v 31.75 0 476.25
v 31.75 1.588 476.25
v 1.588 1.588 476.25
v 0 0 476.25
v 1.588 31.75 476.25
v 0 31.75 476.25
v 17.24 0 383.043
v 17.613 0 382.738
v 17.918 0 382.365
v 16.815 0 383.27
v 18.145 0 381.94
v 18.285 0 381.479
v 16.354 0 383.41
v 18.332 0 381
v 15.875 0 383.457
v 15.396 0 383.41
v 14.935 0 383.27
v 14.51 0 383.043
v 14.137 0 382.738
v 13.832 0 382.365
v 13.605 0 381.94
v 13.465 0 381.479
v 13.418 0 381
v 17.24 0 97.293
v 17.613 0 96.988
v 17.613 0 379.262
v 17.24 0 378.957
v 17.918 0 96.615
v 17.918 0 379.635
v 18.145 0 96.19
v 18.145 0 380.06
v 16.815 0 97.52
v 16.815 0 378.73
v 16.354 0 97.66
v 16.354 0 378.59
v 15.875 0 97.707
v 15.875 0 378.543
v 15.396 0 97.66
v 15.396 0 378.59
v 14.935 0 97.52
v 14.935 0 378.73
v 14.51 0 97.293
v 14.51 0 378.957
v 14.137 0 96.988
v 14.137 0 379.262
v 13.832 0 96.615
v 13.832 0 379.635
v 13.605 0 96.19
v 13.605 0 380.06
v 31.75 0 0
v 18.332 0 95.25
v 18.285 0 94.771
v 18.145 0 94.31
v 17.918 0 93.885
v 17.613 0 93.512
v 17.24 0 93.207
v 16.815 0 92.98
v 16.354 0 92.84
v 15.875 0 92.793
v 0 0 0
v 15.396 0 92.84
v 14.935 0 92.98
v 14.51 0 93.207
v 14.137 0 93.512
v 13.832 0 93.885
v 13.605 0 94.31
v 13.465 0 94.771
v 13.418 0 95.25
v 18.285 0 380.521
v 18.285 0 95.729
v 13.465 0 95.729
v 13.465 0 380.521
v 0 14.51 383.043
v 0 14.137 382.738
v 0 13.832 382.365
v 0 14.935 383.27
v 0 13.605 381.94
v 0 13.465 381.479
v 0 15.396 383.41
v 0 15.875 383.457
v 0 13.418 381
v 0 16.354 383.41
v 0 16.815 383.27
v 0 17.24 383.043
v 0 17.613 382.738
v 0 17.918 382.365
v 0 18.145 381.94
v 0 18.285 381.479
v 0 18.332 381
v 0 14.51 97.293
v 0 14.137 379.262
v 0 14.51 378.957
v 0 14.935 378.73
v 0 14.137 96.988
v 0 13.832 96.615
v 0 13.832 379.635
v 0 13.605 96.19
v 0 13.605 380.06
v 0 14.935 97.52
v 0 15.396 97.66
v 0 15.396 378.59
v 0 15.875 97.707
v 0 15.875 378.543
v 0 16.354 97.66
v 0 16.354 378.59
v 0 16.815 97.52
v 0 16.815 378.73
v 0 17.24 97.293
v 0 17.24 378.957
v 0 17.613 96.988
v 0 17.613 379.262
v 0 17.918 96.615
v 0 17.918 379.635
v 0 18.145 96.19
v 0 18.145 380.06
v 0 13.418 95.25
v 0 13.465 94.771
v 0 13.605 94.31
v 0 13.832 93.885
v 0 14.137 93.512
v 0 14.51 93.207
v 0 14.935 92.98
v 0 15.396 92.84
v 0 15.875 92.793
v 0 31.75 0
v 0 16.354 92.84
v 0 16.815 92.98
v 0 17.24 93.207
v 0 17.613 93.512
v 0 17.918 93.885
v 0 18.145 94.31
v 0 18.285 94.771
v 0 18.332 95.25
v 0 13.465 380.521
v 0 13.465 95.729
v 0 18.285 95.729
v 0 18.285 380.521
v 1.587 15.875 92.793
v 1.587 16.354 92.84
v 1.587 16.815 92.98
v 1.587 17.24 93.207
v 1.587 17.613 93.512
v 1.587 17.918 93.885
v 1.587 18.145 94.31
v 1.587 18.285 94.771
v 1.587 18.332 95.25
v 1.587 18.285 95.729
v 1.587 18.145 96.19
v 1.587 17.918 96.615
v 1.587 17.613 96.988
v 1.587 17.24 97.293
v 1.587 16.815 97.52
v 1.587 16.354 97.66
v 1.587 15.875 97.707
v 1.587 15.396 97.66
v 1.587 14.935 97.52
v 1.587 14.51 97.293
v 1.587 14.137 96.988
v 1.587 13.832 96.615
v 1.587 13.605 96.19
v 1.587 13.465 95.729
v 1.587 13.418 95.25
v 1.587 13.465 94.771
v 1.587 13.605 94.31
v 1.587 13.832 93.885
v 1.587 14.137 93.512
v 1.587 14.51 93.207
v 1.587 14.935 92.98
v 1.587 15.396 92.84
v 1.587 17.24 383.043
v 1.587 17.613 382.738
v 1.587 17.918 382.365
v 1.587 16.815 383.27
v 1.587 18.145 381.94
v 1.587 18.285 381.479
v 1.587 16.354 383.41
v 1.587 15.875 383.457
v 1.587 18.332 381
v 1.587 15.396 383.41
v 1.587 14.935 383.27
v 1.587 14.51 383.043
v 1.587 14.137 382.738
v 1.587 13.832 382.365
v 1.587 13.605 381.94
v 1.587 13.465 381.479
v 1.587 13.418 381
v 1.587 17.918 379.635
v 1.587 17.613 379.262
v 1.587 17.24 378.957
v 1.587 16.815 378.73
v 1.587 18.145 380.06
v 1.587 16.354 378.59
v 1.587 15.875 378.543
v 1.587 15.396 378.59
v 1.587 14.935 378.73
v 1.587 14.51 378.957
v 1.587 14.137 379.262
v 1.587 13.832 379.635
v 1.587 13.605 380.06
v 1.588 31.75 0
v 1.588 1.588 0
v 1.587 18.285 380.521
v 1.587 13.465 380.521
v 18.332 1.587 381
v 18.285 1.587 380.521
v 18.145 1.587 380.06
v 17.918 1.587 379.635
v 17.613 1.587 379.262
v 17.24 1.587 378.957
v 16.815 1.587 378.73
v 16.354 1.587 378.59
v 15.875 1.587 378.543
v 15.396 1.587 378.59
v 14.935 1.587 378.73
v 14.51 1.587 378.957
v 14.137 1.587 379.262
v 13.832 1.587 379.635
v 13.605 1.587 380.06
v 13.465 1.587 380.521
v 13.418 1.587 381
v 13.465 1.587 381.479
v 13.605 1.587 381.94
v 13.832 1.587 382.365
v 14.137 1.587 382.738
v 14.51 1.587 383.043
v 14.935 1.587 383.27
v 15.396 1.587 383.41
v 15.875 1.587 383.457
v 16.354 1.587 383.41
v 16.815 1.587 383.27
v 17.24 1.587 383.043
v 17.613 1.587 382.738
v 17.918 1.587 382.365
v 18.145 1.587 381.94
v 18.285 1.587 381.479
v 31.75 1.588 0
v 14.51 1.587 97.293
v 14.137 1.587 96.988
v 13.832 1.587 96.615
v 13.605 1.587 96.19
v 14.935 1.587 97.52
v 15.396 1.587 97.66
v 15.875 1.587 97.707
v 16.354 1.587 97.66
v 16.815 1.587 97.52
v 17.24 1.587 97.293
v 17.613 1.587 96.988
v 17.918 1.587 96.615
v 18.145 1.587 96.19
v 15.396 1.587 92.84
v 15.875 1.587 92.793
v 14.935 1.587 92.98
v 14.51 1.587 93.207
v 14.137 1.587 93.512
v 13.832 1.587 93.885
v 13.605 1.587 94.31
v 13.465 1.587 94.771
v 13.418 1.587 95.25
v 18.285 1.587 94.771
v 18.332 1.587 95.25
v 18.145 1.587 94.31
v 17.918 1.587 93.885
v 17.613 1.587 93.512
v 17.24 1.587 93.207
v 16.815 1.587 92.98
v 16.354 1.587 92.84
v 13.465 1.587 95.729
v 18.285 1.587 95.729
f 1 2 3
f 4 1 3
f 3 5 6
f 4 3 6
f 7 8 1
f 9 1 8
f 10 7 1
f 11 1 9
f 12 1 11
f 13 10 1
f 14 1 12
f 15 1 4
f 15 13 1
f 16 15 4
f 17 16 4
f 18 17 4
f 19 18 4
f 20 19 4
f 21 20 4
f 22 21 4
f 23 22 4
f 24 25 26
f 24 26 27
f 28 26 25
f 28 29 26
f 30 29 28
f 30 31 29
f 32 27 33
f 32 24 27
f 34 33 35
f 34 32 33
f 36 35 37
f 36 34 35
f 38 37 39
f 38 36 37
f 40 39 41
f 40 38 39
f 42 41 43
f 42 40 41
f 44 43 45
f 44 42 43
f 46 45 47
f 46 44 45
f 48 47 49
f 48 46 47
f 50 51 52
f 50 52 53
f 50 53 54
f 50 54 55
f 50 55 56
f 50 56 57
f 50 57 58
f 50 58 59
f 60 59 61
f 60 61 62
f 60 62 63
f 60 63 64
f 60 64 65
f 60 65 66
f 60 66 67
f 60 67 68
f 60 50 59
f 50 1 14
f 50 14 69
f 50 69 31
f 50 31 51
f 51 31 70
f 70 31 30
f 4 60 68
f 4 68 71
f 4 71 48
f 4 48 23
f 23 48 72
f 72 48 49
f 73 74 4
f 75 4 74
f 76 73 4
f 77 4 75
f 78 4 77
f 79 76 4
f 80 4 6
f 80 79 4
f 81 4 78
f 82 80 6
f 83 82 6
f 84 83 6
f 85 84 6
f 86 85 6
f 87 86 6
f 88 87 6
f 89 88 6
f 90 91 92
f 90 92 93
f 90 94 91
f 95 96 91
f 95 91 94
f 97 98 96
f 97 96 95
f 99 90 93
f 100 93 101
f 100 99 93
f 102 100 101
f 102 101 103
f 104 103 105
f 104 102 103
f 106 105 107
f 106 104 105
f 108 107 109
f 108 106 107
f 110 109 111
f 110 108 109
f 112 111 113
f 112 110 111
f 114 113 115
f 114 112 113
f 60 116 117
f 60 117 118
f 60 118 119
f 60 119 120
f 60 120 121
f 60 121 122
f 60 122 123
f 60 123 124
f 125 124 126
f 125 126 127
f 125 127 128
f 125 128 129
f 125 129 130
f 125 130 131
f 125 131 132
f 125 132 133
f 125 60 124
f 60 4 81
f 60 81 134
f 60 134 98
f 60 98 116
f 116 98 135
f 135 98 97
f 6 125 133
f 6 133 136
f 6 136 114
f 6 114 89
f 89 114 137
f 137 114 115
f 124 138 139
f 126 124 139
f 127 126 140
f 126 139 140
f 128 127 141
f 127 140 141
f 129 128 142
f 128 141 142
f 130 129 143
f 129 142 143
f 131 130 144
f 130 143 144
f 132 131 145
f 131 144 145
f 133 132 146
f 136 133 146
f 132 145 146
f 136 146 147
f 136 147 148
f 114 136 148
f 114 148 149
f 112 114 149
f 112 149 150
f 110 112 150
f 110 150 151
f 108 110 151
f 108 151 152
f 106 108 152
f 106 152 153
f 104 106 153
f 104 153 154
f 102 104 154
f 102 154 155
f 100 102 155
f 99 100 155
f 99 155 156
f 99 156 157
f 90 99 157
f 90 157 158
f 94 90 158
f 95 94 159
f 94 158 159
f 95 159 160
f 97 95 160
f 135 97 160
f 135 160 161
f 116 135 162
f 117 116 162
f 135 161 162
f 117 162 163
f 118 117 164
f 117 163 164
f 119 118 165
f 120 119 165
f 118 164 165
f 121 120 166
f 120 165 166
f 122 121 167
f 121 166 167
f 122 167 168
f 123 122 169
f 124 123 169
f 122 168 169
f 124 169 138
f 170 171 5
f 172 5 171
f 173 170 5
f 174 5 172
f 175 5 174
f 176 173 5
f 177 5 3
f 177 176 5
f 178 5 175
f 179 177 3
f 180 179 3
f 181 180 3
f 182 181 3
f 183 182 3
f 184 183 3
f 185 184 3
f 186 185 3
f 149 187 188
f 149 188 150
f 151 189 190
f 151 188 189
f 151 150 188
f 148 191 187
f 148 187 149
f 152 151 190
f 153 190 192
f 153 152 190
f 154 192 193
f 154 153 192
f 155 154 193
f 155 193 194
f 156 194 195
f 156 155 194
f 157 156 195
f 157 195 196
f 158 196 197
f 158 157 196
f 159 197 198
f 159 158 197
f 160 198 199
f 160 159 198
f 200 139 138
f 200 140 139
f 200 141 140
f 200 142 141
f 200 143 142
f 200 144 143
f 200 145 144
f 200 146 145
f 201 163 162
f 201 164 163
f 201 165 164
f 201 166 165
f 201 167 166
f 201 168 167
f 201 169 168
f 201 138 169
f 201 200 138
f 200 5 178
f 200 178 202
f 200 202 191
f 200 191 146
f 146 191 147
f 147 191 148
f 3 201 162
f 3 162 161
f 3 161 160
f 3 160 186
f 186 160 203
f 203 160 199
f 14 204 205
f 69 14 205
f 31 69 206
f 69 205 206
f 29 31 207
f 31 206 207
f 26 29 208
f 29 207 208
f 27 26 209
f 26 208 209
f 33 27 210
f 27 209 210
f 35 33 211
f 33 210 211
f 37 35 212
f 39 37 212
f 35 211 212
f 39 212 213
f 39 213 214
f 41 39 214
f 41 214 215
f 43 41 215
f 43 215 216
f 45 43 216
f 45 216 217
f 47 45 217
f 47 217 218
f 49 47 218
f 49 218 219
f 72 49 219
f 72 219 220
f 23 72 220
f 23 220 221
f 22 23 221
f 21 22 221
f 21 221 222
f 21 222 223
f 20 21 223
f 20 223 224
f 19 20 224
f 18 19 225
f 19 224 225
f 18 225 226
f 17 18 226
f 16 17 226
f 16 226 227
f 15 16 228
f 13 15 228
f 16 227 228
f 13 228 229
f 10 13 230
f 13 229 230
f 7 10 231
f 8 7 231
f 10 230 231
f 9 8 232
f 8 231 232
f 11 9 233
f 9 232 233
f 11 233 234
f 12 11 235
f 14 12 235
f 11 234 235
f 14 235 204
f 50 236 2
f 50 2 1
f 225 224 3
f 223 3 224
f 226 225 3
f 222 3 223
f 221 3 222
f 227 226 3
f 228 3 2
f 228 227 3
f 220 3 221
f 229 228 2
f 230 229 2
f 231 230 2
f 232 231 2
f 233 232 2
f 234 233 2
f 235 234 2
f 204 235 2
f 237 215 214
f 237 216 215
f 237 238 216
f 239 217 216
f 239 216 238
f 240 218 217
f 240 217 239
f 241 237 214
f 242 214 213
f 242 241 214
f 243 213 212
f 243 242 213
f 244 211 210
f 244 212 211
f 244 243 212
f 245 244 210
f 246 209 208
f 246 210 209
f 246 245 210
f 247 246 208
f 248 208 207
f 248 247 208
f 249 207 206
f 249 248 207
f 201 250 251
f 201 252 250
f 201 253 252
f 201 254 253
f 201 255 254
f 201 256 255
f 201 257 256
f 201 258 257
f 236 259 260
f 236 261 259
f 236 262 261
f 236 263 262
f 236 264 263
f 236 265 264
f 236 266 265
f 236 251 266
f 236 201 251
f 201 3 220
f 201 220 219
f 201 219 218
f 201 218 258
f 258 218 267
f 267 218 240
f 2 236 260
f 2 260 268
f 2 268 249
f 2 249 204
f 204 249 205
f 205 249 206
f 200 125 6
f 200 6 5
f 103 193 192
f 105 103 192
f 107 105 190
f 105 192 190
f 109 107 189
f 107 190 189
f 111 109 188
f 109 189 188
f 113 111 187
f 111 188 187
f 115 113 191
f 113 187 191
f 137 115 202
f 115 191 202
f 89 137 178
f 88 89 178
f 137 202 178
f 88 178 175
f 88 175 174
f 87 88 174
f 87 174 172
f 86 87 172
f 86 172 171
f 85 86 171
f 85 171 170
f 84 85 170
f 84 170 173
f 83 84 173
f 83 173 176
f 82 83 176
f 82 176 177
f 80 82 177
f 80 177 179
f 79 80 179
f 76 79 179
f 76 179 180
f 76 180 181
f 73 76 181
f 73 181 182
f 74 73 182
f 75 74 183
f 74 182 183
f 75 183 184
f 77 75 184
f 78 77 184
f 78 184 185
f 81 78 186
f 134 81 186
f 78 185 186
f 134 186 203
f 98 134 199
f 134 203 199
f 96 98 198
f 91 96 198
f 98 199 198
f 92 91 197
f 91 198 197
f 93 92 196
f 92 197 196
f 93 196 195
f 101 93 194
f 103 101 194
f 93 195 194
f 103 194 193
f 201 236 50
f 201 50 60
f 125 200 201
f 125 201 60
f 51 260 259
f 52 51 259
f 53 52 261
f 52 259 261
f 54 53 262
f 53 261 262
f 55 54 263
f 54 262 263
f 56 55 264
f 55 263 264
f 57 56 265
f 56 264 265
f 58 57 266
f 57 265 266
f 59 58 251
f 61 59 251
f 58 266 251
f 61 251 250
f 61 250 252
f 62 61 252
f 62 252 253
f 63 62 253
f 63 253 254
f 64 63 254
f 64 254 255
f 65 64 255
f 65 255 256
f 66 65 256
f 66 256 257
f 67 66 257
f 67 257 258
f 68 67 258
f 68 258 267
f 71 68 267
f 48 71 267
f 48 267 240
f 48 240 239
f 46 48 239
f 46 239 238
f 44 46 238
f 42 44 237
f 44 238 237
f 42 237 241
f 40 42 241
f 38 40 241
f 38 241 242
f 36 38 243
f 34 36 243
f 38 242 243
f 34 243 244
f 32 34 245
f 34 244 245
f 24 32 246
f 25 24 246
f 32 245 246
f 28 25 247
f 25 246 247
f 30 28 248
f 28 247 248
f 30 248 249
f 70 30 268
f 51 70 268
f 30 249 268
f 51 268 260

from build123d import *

# Parameters (mm, degrees)
BOSS_EXTRUDE1_DEPTH          = 476.25
F_10_0_1935_DIAMETER_HOLE1_D = 4.9149
F_10_0_1935_DIAMETER_HOLE2_D = 4.9149


with BuildPart() as part:
    # Sketch2 → Boss-Extrude1 (new body)
    with BuildSketch(Plane.XY):
        Polygon((0, 0), (0, 31.75), (1.5875, 31.75), (1.5875, 1.5875), (31.75, 1.5875), (31.75, 0), align=None)
    extrude(amount=BOSS_EXTRUDE1_DEPTH)

    # #10 (0.1935) Diameter Hole1 (through all)
    with Locations(Plane.ZY):
        with Locations((95.25, 15.875), (381, 15.875)):
            Hole(F_10_0_1935_DIAMETER_HOLE1_D / 2)

    # #10 (0.1935) Diameter Hole2 (through all)
    with Locations(Plane(origin=(0, 0, 0), x_dir=(-1, 0, 0), z_dir=(0, -1, 0))):
        with Locations((-15.875, -95.25), (-15.875, -381)):
            Hole(F_10_0_1935_DIAMETER_HOLE2_D / 2)


solid = part.part
